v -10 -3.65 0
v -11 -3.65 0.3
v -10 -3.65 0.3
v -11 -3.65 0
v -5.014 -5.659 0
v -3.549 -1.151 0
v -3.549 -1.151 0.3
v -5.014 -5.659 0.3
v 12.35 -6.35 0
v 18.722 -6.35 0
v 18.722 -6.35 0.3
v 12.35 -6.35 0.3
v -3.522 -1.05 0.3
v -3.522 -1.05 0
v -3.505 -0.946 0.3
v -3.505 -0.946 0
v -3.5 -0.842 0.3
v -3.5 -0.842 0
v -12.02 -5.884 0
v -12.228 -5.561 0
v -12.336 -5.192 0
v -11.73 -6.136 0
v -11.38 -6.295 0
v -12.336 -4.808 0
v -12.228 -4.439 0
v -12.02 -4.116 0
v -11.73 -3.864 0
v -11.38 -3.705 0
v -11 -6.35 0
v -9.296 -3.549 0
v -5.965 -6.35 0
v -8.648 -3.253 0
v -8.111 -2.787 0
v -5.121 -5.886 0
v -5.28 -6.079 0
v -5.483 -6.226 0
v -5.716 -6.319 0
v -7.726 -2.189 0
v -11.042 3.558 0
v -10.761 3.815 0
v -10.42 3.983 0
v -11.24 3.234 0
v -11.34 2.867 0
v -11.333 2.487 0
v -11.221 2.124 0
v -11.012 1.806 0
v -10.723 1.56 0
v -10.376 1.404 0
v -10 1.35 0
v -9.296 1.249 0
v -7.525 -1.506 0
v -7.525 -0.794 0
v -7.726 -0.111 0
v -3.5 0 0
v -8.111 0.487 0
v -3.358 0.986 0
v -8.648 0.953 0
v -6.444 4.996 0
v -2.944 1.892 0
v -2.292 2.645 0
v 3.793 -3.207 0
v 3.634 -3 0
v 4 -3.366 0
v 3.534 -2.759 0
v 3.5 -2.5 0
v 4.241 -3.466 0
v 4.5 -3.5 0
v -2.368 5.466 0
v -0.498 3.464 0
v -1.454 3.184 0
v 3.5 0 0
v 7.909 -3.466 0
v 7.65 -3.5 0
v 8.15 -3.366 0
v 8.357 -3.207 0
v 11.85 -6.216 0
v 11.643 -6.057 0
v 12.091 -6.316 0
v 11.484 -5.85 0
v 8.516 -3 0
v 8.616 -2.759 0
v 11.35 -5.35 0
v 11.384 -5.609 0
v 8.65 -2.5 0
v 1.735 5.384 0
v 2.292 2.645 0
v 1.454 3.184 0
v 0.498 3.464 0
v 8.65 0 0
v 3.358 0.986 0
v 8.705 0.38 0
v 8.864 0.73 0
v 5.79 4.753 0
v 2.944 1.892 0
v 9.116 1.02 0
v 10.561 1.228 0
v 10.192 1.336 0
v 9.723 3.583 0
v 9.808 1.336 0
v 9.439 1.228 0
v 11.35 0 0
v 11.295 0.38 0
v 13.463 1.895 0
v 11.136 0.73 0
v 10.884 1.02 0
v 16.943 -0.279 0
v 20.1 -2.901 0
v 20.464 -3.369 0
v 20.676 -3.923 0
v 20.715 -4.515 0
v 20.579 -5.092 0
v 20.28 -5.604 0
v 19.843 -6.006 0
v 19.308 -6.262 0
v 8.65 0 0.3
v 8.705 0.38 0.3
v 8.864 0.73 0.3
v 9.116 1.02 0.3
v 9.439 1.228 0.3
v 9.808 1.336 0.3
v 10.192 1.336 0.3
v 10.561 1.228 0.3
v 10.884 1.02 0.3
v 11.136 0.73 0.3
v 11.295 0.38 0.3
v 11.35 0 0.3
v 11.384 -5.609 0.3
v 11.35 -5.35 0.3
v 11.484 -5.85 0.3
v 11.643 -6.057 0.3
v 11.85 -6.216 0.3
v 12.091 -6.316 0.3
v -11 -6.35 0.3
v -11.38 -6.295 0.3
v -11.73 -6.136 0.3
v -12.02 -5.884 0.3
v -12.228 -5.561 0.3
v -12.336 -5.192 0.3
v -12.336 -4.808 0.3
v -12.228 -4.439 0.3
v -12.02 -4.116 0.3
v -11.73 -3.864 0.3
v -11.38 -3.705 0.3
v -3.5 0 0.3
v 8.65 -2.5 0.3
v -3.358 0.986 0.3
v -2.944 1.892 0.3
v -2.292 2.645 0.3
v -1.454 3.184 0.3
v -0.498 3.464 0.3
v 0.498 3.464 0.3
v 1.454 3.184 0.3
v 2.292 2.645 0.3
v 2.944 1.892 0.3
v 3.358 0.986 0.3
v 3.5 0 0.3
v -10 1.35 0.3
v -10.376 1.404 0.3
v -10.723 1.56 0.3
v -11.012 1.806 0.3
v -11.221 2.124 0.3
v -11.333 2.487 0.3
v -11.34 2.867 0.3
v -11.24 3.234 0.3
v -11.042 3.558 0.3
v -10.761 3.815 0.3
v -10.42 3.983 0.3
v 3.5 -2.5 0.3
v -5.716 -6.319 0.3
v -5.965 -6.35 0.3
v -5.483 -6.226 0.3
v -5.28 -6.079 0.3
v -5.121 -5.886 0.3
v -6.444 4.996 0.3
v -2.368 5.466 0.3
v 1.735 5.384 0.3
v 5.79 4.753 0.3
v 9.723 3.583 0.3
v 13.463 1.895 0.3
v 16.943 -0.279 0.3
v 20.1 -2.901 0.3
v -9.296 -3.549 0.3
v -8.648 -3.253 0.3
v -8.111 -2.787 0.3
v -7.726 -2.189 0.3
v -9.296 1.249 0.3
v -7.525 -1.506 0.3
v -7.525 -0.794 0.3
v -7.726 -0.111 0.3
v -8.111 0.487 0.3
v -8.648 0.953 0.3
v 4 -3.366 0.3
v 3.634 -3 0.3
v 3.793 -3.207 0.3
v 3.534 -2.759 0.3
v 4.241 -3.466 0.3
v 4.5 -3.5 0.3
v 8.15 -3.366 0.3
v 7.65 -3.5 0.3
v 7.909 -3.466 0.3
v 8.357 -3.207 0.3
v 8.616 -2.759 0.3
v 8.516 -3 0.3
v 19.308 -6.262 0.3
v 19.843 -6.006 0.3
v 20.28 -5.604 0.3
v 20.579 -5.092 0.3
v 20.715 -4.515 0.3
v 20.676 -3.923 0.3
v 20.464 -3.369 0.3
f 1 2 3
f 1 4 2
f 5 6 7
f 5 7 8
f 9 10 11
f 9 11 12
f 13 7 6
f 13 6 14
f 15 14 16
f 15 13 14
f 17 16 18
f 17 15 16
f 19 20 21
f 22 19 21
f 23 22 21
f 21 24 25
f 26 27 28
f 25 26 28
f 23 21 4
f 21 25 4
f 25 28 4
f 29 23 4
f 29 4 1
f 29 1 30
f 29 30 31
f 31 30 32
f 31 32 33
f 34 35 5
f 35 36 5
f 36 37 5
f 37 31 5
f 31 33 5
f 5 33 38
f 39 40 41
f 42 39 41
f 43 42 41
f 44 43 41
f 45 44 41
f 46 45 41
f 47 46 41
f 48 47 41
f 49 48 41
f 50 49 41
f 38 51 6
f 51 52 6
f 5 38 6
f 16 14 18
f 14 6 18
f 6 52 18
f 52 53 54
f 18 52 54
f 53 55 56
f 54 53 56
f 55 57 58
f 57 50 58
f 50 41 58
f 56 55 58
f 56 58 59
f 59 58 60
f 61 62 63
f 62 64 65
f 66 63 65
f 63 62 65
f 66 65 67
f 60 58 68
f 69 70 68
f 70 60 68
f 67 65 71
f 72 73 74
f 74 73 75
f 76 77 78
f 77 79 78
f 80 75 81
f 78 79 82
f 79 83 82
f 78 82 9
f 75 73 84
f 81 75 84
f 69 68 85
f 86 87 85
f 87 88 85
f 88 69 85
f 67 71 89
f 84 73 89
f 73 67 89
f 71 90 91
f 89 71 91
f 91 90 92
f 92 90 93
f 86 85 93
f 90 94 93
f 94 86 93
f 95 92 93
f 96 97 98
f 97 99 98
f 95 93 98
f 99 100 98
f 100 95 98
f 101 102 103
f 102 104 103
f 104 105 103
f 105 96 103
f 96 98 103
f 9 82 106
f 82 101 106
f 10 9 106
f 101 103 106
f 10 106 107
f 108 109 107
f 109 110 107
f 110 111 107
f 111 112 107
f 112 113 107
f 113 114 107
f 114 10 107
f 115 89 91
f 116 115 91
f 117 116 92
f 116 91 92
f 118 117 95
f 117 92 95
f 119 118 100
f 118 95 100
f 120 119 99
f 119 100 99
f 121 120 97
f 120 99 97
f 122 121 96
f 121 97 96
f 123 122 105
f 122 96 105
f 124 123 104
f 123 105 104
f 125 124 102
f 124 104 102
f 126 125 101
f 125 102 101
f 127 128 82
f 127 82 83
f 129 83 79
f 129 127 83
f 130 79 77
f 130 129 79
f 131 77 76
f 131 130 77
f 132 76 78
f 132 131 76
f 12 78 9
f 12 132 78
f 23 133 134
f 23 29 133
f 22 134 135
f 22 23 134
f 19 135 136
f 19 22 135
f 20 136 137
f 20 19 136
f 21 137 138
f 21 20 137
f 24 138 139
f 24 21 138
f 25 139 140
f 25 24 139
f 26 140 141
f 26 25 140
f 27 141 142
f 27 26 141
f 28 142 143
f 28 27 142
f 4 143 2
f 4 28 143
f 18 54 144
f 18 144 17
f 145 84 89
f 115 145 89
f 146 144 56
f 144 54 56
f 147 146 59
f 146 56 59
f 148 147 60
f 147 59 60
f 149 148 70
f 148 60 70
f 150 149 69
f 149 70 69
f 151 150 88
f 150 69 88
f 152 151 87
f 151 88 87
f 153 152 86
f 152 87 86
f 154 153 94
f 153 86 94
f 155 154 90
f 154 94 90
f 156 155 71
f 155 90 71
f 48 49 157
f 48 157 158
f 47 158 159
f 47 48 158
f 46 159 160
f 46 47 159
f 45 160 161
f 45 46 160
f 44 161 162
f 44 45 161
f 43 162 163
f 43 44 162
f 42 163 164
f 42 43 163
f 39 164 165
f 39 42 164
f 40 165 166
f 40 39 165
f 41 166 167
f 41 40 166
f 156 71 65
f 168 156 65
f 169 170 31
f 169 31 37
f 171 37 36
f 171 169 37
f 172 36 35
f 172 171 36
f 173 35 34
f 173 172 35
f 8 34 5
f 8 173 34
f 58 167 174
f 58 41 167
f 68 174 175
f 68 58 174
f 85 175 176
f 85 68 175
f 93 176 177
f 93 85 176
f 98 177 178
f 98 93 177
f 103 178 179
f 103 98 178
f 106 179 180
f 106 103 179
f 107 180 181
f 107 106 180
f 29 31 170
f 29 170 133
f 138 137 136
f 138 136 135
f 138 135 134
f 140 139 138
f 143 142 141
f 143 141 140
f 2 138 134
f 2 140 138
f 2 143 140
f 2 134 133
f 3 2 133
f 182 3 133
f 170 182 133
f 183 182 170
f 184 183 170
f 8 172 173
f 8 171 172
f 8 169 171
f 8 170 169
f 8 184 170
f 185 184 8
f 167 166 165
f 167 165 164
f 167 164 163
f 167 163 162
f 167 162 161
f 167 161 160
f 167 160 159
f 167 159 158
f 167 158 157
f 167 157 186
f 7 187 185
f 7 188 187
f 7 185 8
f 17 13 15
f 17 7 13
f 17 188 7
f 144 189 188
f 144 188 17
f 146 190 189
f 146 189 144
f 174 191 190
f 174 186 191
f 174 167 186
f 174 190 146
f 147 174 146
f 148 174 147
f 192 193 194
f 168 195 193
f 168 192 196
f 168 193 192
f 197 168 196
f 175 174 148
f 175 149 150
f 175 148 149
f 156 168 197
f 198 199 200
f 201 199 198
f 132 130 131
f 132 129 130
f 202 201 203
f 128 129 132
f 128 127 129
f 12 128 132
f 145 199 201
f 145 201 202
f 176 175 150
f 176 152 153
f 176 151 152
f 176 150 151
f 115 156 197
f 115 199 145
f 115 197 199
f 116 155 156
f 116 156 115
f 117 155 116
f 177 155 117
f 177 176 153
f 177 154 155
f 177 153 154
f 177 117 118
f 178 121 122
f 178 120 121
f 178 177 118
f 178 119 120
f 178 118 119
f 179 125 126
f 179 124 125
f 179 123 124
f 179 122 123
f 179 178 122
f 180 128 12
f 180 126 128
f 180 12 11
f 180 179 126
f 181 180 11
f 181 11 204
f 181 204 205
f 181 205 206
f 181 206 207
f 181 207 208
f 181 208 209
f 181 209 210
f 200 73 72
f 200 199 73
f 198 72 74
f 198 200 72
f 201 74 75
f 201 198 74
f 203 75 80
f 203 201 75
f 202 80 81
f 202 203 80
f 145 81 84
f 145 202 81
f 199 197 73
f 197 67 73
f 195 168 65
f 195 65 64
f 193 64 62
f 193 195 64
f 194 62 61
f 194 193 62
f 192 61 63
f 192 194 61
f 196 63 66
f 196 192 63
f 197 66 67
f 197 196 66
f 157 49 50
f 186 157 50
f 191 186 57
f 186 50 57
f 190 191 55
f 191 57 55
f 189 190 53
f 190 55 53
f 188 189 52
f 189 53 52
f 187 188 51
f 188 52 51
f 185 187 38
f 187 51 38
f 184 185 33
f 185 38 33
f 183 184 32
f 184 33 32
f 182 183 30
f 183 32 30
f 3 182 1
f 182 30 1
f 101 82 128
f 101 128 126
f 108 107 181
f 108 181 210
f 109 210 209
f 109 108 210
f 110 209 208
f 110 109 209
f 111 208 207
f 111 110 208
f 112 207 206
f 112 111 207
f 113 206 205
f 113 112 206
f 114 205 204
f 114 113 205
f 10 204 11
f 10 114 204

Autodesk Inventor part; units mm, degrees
ref_plane "YZ Plane" through (0, 0, 0) normal (1, 0, 0) x (0, 1, 0)
ref_plane "XZ Plane" through (0, 0, 0) normal (0, 1, 0) x (-1, 0, 0)
ref_plane "XY Plane" through (0, 0, 0) normal (0, 0, 1) x (1, 0, 0)
sketch "Sketch1" plane through (0, 0, 0) normal (0, 0, 1) x (1, 0, 0)
  circle A0 centre (0, 0) radius 3.5
  circle A1 centre (10, 0) radius 1.35
  circle A2 centre (18.7217, -4.35) radius 2
  line L0 (-3.5, 0) -> (-3.5, -1)
  line L1 (-3.5, -1) -> (-5.2383, -6.35)
  line L2 (-5.2383, -6.35) -> (-11, -6.35)
  line L3 (3.5, 0) -> (3.5, -3.5)
  line L4 (3.5, -3.5) -> (8.65, -3.5)
  line L5 (8.65, -3.5) -> (8.65, 0)
  arc A3 (20.1001, -2.9009) -> (-10.4205, 3.9828) centre (-0.9208, -25) ccw
  circle A4 centre (-10, 2.7) radius 1.35
  circle A5 centre (-11, -5) radius 1.35
  line L6 (18.7217, -6.35) -> (11.35, -6.35)
  line L7 (11.35, -6.35) -> (11.35, 0)
  line L8 (-11, -3.65) -> (-10, -3.65)
  arc A6 (-10, -3.65) -> (-10, 1.35) centre (-10, -1.15) ccw
  line L9 (-10, 1.35) -> (-10, 1.35)
  dimension "d0" = 3.5
  dimension "d1" = 1.35
  dimension "d2" = 10
  dimension "d5" = 1
  dimension "d6" = 30.5
  dimension "d10" = 20
  dimension "d15" = 21.5
  dimension "d16" = 18
  dimension "d18" = 2
  dimension "d20" = 10
  dimension "d21" = 11
  dimension "d22" = 2.5
extrude "Extrusion1" add sketch "Sketch1" along normal blind 0.3 contours A0 L0 L1 L2 A5 L8 A6 A4 A3 A2 L6 L7 A1 L5 L4 L3 | A5 | A2 | A4
fillet "Fillet1" radius 1 5 edges at (-5.2383, -6.35, 0.15) (-3.5, -1, 0.15) (3.5, -3.5, 0.15) (8.65, -3.5, 0.15) (11.35, -6.35, 0.15)
properties part number "308-15" material "Steel"
